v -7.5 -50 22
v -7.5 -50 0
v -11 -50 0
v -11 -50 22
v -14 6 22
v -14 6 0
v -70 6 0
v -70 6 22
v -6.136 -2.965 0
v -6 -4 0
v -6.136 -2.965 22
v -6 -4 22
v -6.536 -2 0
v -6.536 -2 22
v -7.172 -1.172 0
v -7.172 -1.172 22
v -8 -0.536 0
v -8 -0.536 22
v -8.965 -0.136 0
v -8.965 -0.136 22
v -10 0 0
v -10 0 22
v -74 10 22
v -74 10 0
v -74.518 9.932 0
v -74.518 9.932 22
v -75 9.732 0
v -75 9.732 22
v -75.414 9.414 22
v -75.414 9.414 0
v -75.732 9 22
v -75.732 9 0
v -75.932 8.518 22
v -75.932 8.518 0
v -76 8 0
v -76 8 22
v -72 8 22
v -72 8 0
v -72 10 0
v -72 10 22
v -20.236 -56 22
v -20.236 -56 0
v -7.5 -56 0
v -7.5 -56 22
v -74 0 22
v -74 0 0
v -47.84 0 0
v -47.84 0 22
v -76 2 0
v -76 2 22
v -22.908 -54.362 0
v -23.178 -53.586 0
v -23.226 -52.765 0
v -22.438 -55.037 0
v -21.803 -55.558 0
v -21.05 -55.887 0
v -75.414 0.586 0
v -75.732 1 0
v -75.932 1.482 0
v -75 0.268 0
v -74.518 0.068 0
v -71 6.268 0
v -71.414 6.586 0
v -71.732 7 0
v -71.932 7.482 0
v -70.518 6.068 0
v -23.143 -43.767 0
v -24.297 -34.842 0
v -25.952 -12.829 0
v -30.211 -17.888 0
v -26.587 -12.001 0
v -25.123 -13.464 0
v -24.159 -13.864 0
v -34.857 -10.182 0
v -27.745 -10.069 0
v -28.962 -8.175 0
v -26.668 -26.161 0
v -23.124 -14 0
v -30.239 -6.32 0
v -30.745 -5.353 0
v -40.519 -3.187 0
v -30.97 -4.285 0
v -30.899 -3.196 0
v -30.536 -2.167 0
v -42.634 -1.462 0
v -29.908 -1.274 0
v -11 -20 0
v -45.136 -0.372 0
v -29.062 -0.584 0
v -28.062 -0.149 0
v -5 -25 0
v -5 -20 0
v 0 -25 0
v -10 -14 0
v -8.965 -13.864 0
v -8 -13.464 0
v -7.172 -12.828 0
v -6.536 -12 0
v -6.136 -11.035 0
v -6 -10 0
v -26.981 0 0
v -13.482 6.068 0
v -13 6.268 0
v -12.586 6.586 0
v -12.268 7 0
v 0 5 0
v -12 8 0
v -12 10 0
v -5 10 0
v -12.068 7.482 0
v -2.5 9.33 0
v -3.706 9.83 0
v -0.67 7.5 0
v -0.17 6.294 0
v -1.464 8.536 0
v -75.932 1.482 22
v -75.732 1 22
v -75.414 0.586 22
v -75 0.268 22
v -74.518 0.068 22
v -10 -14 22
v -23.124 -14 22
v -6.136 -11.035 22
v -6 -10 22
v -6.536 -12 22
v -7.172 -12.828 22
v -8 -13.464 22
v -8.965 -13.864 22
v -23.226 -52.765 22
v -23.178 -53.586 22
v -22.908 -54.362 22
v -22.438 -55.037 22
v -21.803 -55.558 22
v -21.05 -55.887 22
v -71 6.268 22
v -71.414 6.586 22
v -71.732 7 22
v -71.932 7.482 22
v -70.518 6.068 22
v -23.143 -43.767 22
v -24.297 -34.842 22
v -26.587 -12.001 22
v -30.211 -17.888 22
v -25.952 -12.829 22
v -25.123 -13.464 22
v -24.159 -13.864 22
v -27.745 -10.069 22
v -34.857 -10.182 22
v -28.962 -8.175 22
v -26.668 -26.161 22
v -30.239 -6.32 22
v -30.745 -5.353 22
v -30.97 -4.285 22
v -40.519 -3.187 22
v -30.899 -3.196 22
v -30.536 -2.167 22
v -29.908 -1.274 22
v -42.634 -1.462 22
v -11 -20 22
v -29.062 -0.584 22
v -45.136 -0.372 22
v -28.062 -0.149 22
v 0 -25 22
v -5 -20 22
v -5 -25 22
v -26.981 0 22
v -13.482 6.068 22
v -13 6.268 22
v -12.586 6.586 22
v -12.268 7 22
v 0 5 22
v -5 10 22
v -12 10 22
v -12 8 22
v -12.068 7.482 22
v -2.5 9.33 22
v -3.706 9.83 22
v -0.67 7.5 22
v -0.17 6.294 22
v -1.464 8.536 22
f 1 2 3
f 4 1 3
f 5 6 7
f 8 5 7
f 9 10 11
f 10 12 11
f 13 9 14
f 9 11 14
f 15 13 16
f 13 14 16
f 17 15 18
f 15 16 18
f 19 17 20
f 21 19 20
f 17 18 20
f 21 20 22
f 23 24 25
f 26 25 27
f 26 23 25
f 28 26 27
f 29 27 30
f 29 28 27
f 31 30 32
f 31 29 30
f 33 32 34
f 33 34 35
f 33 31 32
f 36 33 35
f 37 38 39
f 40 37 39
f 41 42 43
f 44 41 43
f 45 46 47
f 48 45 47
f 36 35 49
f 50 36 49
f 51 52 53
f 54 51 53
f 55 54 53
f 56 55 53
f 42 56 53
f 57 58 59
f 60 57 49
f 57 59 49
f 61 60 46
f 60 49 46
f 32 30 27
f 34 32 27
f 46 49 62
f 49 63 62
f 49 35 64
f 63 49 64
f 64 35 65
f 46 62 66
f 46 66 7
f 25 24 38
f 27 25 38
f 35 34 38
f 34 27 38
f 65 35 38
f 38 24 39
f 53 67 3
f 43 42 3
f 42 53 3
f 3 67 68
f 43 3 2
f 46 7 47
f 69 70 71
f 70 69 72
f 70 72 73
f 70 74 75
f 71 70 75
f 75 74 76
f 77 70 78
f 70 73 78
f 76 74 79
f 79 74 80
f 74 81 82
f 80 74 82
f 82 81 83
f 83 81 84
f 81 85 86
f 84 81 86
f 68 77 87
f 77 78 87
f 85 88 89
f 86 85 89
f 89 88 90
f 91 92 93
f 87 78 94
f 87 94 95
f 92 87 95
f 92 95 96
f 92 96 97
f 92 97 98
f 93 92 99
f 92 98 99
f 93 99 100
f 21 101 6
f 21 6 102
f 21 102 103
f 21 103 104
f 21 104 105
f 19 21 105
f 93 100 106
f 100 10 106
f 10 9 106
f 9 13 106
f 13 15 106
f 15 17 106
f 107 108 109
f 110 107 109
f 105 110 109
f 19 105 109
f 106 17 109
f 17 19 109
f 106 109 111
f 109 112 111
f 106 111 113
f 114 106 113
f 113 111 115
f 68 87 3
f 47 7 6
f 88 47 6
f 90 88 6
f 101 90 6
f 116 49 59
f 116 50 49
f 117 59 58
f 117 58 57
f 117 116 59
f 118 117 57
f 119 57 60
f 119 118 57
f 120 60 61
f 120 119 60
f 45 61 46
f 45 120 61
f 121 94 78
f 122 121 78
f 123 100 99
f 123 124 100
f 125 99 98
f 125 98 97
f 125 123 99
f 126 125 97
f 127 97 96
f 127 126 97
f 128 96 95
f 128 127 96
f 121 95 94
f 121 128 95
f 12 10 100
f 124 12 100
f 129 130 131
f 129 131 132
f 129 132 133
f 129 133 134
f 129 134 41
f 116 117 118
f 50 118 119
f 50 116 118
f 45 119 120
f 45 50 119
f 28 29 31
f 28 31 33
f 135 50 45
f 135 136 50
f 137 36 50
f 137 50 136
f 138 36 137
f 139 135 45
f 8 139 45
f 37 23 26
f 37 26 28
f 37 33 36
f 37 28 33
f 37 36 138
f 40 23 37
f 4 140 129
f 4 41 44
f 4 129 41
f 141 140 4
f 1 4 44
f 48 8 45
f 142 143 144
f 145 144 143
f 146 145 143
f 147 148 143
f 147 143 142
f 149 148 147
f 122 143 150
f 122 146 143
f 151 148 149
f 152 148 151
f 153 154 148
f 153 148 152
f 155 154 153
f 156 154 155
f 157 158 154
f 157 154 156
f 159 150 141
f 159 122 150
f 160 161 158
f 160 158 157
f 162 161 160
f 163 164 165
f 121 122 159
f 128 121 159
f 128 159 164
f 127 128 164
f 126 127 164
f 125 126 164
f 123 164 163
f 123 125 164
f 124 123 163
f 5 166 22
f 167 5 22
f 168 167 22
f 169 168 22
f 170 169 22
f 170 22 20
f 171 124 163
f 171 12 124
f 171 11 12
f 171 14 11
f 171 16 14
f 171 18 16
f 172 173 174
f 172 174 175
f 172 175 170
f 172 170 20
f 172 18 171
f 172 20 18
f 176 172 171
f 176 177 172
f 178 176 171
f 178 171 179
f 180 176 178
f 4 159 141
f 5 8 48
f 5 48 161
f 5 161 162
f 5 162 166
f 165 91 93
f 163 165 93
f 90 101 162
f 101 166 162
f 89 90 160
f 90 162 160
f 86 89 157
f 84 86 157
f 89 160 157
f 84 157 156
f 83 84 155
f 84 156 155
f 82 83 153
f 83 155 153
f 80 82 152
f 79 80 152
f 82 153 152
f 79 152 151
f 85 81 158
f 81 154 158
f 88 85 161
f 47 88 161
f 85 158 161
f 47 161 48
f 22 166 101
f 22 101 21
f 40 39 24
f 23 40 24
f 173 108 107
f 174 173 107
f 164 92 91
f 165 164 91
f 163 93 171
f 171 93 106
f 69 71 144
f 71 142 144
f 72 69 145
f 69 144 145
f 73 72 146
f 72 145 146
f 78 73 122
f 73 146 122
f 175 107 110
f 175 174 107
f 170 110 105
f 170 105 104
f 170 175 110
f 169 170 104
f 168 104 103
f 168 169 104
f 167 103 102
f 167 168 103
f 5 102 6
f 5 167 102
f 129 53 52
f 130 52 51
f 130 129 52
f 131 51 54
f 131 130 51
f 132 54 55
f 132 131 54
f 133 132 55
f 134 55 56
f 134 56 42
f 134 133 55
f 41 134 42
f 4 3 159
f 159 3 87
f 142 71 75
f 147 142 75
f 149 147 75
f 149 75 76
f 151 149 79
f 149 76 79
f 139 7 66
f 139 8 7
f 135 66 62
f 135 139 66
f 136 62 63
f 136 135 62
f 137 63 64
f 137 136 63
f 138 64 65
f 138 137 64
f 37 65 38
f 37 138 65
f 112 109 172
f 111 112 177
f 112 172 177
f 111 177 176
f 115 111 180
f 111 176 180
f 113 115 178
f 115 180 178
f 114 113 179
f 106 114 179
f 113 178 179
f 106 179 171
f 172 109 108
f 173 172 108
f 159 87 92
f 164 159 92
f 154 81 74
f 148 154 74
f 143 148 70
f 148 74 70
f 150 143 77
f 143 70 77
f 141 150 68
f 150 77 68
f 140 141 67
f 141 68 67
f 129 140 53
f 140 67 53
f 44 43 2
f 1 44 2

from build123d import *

# Parameters (mm, degrees)
F1_DEPTH = 22
F2_R     = 10
F3_R     = 3
F4_R     = 4
F5_R     = 5
F6_R     = 2
F7_R     = 2


with BuildPart() as f1:
    # F0 (on Top) → F1 (new body)
    with BuildSketch(Plane.XY):
        with BuildLine():
            ThreePointArc((-43.69757, 0), (-26.876888, -25.571939), (-23.561389, -56))
            Line((-23.561389, -56), (-7.5, -56))
            Line((-7.5, -56), (-7.5, -50))
            Line((-7.5, -50), (-11, -50))
            Line((-11, -50), (-11, -20))
            Line((-11, -20), (-5, -20))
            Line((-5, -20), (-5, -25))
            Line((-5, -25), (0, -25))
            Line((0, -25), (0, 0))
            Line((0, 0), (0, 10))
            Line((0, 10), (-12, 10))
            Line((-12, 10), (-12, 6))
            Line((-12, 6), (-72, 6))
            Line((-72, 6), (-72, 10))
            Line((-72, 10), (-76, 10))
            Line((-76, 10), (-76, 0))
            Line((-76, 0), (-43.69757, 0))
        make_face()
        with BuildLine():
            Line((-6, -14), (-25.474719, -14))
            ThreePointArc((-25.474719, -14), (-29.967584, -6.70409), (-35.303435, 0))
            Line((-35.303435, 0), (-6, 0))
            Line((-6, 0), (-6, -14))
        make_face(mode=Mode.SUBTRACT)
    extrude(amount=F1_DEPTH)

    # F2
    f2_edges = [f1.edges().sort_by_distance(p)[0] for p in [
        (-43.69757, 0, 11),
    ]]
    fillet(f2_edges, radius=F2_R)

    # F3
    f3_edges = [f1.edges().sort_by_distance(p)[0] for p in [
        (-23.561389, -56, 11),
    ]]
    fillet(f3_edges, radius=F3_R)

    # F4
    f4_edges = [f1.edges().sort_by_distance(p)[0] for p in [
        (-35.303435, 0, 11),
        (-6, 0, 11),
        (-25.474719, -14, 11),
        (-6, -14, 11),
    ]]
    fillet(f4_edges, radius=F4_R)

    # F5
    f5_edges = [f1.edges().sort_by_distance(p)[0] for p in [
        (0, 10, 11),
    ]]
    fillet(f5_edges, radius=F5_R)

    # F6
    f6_edges = [f1.edges().sort_by_distance(p)[0] for p in [
        (-12, 6, 11),
        (-72, 6, 11),
    ]]
    fillet(f6_edges, radius=F6_R)

    # F7
    f7_edges = [f1.edges().sort_by_distance(p)[0] for p in [
        (-76, 10, 11),
        (-76, 0, 11),
    ]]
    fillet(f7_edges, radius=F7_R)


solid = f1.part
